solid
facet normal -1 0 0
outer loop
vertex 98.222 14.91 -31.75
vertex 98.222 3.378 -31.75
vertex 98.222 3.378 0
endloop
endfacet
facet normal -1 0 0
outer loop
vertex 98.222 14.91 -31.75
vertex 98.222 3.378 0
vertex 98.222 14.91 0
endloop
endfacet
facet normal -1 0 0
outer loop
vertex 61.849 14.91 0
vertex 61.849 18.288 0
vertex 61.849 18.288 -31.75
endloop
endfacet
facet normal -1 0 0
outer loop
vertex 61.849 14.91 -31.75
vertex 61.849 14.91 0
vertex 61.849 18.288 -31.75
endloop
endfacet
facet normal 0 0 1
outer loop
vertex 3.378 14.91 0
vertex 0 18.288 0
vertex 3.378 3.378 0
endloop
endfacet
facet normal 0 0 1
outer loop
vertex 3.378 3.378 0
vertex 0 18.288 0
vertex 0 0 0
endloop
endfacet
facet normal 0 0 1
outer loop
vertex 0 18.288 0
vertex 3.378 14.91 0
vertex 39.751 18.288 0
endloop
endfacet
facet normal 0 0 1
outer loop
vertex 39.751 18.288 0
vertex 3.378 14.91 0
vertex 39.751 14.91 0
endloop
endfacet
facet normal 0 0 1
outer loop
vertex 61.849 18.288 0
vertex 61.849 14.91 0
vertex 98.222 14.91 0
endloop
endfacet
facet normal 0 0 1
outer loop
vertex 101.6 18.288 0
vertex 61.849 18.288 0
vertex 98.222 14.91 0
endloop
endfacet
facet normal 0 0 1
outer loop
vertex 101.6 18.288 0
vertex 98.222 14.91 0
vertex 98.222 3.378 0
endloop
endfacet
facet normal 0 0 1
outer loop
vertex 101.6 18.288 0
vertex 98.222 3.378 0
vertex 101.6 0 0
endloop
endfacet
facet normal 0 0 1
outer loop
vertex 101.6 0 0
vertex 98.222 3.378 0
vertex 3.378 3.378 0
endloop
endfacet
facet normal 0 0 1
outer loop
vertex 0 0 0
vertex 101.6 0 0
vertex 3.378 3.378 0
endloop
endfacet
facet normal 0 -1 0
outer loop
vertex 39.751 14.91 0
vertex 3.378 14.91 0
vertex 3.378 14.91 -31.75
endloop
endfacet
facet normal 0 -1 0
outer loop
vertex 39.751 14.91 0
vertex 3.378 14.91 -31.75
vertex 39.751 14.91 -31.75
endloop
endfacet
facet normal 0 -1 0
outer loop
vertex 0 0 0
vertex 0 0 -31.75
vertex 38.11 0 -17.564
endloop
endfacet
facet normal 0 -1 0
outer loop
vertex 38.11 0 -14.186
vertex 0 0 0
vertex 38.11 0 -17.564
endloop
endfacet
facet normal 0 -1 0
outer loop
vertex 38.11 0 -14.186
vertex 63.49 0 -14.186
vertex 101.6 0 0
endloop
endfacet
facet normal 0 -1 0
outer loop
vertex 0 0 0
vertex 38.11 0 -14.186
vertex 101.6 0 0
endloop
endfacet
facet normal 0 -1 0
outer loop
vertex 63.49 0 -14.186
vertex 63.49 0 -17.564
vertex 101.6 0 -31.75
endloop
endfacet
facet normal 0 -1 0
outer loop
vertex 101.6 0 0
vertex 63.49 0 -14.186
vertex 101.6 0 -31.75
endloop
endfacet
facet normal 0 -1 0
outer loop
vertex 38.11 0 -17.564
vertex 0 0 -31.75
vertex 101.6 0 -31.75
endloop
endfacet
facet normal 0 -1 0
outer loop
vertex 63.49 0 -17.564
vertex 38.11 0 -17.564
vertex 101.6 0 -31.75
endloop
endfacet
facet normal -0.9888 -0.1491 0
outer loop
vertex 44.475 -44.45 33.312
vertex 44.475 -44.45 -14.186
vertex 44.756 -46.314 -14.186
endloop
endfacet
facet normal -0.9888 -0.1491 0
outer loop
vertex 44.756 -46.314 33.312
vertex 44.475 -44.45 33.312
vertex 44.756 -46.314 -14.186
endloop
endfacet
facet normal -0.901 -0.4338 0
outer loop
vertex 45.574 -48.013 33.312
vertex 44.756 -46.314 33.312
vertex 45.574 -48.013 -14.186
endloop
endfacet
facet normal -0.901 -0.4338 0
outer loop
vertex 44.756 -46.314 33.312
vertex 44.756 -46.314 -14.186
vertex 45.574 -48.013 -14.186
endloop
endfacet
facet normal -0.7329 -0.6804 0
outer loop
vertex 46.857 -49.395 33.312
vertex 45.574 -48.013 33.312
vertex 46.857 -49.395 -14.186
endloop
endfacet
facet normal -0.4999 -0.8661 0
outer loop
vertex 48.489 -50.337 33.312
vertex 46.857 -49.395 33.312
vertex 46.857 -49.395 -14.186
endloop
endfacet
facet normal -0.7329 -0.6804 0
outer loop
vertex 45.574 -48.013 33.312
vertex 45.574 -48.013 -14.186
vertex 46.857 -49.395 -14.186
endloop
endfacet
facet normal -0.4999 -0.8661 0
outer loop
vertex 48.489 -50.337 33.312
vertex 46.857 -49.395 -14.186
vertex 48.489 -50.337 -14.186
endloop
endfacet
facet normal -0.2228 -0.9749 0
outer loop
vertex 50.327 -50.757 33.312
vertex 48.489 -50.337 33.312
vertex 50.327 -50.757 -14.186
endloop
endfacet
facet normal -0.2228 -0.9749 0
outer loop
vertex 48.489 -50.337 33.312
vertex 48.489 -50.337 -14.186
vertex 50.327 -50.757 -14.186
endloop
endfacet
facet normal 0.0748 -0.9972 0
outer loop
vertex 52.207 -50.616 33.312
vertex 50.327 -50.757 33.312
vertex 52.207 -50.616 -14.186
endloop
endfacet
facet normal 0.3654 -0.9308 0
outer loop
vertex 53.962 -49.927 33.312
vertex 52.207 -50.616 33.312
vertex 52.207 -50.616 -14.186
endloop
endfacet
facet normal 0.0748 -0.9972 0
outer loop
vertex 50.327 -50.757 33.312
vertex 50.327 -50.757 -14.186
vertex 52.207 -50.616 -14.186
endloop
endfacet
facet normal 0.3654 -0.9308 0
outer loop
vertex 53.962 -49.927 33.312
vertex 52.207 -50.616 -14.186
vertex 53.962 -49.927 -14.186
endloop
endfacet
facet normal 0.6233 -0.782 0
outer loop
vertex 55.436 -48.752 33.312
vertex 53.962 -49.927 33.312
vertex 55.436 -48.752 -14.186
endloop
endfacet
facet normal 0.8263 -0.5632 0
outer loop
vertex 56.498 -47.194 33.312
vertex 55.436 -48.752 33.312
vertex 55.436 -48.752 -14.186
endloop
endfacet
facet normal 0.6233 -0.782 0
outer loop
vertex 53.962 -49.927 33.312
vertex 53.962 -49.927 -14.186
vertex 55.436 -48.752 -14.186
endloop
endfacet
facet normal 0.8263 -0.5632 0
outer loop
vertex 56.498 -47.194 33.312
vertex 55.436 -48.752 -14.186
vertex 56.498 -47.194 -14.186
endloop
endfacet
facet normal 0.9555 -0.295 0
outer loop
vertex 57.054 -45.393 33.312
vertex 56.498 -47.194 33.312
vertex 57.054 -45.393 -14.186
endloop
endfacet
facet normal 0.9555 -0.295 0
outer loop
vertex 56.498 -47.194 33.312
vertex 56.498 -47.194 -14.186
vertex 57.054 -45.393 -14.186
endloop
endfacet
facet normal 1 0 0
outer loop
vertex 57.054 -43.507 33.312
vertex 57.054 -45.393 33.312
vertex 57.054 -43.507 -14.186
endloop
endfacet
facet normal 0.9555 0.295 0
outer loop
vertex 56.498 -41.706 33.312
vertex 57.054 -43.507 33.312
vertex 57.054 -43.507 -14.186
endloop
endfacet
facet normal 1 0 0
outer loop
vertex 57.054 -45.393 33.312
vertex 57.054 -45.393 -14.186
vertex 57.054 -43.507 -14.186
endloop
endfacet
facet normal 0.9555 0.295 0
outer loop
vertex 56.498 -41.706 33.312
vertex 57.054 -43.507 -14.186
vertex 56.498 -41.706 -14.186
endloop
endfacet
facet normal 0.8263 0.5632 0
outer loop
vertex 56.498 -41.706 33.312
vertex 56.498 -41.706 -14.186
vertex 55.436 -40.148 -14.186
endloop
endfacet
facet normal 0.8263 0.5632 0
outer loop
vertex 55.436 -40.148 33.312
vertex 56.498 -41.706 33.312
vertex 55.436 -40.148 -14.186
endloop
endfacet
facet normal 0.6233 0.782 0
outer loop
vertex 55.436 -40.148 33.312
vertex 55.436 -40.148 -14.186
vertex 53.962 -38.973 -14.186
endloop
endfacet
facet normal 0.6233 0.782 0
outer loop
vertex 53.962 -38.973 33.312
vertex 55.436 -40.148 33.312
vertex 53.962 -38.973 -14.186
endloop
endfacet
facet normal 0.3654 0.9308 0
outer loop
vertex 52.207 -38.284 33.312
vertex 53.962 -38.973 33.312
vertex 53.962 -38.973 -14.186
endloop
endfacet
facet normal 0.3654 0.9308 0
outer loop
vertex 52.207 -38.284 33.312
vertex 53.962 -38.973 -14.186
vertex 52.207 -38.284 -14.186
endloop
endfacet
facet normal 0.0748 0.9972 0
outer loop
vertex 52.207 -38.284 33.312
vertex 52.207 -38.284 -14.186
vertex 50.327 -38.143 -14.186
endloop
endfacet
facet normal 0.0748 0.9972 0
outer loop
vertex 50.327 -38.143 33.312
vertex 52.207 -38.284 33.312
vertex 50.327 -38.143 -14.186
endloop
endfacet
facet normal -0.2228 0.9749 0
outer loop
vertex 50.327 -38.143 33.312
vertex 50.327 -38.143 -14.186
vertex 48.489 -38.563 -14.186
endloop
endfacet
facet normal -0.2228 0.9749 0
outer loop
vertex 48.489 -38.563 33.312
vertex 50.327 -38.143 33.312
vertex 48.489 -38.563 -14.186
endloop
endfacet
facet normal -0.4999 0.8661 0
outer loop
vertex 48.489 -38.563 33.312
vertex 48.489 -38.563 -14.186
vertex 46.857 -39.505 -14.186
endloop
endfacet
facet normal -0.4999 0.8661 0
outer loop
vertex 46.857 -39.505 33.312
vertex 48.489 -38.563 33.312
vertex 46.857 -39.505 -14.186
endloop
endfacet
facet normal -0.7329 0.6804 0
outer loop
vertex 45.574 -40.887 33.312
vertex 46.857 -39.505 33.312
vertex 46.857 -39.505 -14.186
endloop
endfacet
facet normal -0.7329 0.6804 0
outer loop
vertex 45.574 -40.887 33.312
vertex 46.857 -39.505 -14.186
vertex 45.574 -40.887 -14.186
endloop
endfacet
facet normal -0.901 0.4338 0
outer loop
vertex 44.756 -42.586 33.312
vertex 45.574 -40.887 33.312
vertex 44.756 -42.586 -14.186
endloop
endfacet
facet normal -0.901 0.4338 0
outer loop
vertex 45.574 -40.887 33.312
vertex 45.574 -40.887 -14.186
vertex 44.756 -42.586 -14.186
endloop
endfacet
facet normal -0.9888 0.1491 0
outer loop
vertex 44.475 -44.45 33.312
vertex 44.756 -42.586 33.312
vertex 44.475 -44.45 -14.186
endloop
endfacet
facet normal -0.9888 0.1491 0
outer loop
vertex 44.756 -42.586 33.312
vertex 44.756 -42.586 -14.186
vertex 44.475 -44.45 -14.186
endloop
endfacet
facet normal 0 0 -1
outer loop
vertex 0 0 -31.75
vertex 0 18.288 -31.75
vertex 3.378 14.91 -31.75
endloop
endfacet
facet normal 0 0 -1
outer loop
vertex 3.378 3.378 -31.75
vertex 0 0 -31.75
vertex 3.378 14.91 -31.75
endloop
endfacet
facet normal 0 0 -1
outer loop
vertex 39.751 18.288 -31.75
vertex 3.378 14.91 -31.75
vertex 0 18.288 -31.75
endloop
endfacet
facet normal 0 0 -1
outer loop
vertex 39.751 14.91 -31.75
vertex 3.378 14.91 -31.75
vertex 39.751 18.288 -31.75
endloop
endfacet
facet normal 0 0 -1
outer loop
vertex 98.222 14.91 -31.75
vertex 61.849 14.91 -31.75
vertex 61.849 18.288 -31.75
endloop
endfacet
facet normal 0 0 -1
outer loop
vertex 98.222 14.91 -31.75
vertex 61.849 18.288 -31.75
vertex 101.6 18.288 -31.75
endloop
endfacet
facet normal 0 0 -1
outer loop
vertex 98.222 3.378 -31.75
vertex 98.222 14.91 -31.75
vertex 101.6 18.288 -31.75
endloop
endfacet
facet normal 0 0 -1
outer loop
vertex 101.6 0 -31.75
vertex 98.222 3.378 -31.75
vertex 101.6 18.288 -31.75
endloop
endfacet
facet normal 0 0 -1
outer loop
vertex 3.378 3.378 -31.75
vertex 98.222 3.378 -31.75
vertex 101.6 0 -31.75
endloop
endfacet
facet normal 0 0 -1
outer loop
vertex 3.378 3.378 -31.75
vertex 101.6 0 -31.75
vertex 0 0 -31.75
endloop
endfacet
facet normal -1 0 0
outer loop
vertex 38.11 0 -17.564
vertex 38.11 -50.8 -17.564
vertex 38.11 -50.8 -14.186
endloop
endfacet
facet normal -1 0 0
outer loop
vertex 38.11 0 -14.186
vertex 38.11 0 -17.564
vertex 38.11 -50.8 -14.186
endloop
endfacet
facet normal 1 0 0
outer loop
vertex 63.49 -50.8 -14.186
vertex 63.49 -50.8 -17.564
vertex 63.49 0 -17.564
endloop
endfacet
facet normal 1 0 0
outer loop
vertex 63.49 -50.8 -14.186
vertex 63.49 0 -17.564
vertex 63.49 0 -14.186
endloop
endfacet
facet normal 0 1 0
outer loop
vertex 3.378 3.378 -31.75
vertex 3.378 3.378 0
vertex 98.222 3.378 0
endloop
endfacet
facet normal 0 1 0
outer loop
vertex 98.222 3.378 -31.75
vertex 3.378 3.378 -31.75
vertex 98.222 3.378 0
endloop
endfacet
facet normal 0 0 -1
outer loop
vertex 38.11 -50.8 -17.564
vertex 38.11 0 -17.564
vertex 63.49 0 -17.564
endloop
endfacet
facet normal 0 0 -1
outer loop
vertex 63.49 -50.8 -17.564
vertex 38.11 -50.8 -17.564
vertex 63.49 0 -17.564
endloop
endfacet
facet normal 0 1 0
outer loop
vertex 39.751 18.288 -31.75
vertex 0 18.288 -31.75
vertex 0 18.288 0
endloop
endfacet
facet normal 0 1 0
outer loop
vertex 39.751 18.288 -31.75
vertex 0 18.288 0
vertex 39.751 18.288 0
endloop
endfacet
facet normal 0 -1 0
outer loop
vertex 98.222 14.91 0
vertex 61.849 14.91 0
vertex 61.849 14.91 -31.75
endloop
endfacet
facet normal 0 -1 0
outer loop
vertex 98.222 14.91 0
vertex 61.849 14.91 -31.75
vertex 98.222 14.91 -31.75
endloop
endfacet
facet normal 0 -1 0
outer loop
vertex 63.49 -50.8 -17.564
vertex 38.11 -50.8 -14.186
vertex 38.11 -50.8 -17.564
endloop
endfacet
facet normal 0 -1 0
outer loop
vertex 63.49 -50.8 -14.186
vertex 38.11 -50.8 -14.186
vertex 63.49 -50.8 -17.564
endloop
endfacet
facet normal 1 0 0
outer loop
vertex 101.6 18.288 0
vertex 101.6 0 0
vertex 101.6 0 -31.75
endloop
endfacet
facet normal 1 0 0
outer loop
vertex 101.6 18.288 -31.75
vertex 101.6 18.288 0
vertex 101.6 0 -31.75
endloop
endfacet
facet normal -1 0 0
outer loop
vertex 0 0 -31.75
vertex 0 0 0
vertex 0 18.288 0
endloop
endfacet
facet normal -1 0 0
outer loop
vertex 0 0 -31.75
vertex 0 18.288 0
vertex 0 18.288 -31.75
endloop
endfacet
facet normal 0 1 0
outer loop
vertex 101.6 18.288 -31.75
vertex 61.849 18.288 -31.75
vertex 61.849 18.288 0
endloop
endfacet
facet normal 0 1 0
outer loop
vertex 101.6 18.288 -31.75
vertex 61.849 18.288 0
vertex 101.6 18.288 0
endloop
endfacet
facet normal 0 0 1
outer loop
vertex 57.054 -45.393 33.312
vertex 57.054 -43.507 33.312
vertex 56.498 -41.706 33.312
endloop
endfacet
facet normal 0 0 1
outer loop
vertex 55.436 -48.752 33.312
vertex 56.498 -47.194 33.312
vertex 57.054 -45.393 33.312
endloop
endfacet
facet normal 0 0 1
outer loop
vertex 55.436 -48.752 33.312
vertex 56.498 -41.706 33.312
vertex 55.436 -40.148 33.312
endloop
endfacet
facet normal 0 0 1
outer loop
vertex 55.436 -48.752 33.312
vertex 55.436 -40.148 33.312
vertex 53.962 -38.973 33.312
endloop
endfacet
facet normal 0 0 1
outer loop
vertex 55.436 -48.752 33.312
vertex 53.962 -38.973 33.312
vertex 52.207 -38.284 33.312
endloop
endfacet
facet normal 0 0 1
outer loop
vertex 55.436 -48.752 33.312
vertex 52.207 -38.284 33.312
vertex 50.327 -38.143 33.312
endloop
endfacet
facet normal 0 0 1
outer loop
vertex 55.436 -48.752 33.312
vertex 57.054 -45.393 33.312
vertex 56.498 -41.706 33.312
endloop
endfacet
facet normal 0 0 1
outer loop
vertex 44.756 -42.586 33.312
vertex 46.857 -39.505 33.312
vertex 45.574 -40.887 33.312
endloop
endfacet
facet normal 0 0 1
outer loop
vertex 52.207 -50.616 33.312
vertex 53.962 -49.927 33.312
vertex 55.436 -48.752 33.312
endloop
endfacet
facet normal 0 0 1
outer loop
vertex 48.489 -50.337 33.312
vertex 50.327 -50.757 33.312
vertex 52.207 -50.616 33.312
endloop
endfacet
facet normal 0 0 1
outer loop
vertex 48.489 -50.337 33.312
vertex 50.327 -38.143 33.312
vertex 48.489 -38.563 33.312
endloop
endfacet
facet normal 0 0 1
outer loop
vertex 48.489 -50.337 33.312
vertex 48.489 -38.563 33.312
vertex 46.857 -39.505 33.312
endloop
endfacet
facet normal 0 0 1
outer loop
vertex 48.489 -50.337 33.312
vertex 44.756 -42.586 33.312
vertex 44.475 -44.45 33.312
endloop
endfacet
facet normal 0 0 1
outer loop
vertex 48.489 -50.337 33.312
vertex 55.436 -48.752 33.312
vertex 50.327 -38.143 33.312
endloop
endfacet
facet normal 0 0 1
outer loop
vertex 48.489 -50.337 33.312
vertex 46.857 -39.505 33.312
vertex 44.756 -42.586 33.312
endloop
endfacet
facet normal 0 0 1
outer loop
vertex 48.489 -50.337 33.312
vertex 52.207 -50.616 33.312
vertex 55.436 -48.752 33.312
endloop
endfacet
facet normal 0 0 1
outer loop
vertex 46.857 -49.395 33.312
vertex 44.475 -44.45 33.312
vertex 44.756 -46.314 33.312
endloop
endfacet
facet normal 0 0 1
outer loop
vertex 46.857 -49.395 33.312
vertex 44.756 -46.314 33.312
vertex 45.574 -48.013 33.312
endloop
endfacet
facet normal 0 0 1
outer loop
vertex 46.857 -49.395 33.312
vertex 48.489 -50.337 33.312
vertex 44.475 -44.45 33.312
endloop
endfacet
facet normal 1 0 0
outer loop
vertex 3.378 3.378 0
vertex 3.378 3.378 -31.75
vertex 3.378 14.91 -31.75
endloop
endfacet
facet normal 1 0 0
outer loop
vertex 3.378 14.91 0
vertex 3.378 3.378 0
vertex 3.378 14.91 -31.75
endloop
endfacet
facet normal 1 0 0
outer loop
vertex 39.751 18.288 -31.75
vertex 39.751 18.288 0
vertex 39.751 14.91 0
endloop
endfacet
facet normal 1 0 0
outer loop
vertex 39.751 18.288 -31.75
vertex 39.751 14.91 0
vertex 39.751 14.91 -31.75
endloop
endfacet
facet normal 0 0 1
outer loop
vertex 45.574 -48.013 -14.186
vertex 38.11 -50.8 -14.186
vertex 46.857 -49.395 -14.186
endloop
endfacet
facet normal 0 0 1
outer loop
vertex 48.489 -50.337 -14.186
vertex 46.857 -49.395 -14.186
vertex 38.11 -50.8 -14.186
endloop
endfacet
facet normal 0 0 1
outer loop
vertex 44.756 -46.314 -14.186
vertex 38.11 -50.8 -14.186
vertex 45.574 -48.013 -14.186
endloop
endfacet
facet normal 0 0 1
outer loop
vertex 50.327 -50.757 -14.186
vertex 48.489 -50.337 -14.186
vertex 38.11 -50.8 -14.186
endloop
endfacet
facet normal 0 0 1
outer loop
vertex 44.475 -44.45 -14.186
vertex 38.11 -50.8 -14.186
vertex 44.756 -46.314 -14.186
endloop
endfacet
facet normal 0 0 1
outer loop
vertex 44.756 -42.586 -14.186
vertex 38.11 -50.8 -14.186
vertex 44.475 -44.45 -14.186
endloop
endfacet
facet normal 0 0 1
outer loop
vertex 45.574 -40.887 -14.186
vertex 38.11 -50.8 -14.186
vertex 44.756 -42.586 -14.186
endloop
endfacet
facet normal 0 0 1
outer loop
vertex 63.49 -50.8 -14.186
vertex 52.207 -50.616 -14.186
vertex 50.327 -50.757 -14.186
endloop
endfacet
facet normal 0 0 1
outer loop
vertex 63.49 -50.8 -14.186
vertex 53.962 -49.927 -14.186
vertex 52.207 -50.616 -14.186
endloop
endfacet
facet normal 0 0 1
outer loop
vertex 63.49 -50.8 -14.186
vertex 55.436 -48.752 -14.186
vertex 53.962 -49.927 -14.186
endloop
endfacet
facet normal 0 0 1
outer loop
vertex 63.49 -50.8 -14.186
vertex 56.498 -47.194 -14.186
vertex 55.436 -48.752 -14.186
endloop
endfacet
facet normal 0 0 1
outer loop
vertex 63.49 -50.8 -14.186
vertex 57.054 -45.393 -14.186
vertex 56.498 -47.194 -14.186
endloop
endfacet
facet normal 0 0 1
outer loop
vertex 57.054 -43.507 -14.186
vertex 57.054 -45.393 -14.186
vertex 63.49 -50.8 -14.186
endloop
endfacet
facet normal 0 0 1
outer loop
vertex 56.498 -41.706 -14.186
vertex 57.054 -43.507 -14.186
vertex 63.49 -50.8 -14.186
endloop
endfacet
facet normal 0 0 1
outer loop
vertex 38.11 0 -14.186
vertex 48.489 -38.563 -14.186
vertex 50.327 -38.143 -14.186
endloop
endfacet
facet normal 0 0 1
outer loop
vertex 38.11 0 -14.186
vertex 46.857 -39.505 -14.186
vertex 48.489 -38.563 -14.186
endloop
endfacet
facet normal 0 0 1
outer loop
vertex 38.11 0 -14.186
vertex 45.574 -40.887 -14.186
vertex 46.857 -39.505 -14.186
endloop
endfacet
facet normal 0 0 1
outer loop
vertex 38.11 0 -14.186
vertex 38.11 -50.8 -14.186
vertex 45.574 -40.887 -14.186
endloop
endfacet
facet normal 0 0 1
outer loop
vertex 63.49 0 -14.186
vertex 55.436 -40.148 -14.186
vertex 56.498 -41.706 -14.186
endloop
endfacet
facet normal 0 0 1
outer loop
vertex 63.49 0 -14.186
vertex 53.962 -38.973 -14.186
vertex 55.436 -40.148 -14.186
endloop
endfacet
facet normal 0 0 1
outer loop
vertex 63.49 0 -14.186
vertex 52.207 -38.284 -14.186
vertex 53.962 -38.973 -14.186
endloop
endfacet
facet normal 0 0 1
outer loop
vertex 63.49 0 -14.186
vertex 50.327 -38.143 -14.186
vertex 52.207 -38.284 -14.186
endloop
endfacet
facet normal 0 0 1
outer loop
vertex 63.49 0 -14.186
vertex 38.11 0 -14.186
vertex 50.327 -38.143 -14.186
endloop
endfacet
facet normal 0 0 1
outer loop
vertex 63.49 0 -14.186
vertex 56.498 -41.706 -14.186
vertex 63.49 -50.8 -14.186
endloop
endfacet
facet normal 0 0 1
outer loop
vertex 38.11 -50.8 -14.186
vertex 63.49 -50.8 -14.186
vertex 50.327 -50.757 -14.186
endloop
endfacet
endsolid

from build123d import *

# Parameters (mm, degrees)
SKETCH1_W           = 101.6
SKETCH1_H           = 31.75
BOSS_EXTRUDE1_DEPTH = 18.288
SKETCH2_W           = 22.098
SKETCH2_H           = 31.75
CUT_EXTRUDE1_DEPTH  = 14.9098
SKETCH3_W           = 36.3728
SKETCH3_H           = 11.5316
CUT_EXTRUDE2_DEPTH  = 109.004969534
SKETCH4_W           = 25.37968
SKETCH4_H           = 3.3782
BOSS_EXTRUDE2_DEPTH = 50.8
SKETCH5_R           = 6.3246
BOSS_EXTRUDE3_DEPTH = 47.498


with BuildPart() as part:
    # Sketch1 → Boss-Extrude1 (new body)
    with BuildSketch(Plane(origin=(0, 0, 0), x_dir=(1, 0, 0), z_dir=(0, 1, 0))):
        with Locations((50.8, 15.875)):
            Rectangle(SKETCH1_W, SKETCH1_H)
    extrude(amount=BOSS_EXTRUDE1_DEPTH)

    # Sketch2 → Cut-Extrude1 (cut)
    with BuildSketch(Plane(origin=(0, 18.288, 0), x_dir=(1, 0, 0), z_dir=(0, 1, 0))):
        with Locations((50.8, 15.875)):
            Rectangle(SKETCH2_W, SKETCH2_H)
    extrude(amount=-CUT_EXTRUDE1_DEPTH, mode=Mode.SUBTRACT)

    # Sketch3 → Cut-Extrude2 (cut, through all)
    with BuildSketch(Plane.XY):
        with Locations((21.5646, 9.144)):
            Rectangle(SKETCH3_W, SKETCH3_H)
        with Locations((80.0354, 9.144)):
            Rectangle(SKETCH3_W, SKETCH3_H)
    extrude(amount=-CUT_EXTRUDE2_DEPTH, mode=Mode.SUBTRACT)

    # Sketch4 → Boss-Extrude2 (add)
    with BuildSketch(Plane.XZ):
        with Locations((50.8, -15.875)):
            Rectangle(SKETCH4_W, SKETCH4_H)
    extrude(amount=BOSS_EXTRUDE2_DEPTH)

    # Sketch5 → Boss-Extrude3 (add)
    with BuildSketch(Plane.XY.offset(-14.1859)):
        with Locations(Location((50.8, -44.45, 0), (0, 0, 180))):
            Circle(SKETCH5_R)
    extrude(amount=BOSS_EXTRUDE3_DEPTH)


solid = part.part
